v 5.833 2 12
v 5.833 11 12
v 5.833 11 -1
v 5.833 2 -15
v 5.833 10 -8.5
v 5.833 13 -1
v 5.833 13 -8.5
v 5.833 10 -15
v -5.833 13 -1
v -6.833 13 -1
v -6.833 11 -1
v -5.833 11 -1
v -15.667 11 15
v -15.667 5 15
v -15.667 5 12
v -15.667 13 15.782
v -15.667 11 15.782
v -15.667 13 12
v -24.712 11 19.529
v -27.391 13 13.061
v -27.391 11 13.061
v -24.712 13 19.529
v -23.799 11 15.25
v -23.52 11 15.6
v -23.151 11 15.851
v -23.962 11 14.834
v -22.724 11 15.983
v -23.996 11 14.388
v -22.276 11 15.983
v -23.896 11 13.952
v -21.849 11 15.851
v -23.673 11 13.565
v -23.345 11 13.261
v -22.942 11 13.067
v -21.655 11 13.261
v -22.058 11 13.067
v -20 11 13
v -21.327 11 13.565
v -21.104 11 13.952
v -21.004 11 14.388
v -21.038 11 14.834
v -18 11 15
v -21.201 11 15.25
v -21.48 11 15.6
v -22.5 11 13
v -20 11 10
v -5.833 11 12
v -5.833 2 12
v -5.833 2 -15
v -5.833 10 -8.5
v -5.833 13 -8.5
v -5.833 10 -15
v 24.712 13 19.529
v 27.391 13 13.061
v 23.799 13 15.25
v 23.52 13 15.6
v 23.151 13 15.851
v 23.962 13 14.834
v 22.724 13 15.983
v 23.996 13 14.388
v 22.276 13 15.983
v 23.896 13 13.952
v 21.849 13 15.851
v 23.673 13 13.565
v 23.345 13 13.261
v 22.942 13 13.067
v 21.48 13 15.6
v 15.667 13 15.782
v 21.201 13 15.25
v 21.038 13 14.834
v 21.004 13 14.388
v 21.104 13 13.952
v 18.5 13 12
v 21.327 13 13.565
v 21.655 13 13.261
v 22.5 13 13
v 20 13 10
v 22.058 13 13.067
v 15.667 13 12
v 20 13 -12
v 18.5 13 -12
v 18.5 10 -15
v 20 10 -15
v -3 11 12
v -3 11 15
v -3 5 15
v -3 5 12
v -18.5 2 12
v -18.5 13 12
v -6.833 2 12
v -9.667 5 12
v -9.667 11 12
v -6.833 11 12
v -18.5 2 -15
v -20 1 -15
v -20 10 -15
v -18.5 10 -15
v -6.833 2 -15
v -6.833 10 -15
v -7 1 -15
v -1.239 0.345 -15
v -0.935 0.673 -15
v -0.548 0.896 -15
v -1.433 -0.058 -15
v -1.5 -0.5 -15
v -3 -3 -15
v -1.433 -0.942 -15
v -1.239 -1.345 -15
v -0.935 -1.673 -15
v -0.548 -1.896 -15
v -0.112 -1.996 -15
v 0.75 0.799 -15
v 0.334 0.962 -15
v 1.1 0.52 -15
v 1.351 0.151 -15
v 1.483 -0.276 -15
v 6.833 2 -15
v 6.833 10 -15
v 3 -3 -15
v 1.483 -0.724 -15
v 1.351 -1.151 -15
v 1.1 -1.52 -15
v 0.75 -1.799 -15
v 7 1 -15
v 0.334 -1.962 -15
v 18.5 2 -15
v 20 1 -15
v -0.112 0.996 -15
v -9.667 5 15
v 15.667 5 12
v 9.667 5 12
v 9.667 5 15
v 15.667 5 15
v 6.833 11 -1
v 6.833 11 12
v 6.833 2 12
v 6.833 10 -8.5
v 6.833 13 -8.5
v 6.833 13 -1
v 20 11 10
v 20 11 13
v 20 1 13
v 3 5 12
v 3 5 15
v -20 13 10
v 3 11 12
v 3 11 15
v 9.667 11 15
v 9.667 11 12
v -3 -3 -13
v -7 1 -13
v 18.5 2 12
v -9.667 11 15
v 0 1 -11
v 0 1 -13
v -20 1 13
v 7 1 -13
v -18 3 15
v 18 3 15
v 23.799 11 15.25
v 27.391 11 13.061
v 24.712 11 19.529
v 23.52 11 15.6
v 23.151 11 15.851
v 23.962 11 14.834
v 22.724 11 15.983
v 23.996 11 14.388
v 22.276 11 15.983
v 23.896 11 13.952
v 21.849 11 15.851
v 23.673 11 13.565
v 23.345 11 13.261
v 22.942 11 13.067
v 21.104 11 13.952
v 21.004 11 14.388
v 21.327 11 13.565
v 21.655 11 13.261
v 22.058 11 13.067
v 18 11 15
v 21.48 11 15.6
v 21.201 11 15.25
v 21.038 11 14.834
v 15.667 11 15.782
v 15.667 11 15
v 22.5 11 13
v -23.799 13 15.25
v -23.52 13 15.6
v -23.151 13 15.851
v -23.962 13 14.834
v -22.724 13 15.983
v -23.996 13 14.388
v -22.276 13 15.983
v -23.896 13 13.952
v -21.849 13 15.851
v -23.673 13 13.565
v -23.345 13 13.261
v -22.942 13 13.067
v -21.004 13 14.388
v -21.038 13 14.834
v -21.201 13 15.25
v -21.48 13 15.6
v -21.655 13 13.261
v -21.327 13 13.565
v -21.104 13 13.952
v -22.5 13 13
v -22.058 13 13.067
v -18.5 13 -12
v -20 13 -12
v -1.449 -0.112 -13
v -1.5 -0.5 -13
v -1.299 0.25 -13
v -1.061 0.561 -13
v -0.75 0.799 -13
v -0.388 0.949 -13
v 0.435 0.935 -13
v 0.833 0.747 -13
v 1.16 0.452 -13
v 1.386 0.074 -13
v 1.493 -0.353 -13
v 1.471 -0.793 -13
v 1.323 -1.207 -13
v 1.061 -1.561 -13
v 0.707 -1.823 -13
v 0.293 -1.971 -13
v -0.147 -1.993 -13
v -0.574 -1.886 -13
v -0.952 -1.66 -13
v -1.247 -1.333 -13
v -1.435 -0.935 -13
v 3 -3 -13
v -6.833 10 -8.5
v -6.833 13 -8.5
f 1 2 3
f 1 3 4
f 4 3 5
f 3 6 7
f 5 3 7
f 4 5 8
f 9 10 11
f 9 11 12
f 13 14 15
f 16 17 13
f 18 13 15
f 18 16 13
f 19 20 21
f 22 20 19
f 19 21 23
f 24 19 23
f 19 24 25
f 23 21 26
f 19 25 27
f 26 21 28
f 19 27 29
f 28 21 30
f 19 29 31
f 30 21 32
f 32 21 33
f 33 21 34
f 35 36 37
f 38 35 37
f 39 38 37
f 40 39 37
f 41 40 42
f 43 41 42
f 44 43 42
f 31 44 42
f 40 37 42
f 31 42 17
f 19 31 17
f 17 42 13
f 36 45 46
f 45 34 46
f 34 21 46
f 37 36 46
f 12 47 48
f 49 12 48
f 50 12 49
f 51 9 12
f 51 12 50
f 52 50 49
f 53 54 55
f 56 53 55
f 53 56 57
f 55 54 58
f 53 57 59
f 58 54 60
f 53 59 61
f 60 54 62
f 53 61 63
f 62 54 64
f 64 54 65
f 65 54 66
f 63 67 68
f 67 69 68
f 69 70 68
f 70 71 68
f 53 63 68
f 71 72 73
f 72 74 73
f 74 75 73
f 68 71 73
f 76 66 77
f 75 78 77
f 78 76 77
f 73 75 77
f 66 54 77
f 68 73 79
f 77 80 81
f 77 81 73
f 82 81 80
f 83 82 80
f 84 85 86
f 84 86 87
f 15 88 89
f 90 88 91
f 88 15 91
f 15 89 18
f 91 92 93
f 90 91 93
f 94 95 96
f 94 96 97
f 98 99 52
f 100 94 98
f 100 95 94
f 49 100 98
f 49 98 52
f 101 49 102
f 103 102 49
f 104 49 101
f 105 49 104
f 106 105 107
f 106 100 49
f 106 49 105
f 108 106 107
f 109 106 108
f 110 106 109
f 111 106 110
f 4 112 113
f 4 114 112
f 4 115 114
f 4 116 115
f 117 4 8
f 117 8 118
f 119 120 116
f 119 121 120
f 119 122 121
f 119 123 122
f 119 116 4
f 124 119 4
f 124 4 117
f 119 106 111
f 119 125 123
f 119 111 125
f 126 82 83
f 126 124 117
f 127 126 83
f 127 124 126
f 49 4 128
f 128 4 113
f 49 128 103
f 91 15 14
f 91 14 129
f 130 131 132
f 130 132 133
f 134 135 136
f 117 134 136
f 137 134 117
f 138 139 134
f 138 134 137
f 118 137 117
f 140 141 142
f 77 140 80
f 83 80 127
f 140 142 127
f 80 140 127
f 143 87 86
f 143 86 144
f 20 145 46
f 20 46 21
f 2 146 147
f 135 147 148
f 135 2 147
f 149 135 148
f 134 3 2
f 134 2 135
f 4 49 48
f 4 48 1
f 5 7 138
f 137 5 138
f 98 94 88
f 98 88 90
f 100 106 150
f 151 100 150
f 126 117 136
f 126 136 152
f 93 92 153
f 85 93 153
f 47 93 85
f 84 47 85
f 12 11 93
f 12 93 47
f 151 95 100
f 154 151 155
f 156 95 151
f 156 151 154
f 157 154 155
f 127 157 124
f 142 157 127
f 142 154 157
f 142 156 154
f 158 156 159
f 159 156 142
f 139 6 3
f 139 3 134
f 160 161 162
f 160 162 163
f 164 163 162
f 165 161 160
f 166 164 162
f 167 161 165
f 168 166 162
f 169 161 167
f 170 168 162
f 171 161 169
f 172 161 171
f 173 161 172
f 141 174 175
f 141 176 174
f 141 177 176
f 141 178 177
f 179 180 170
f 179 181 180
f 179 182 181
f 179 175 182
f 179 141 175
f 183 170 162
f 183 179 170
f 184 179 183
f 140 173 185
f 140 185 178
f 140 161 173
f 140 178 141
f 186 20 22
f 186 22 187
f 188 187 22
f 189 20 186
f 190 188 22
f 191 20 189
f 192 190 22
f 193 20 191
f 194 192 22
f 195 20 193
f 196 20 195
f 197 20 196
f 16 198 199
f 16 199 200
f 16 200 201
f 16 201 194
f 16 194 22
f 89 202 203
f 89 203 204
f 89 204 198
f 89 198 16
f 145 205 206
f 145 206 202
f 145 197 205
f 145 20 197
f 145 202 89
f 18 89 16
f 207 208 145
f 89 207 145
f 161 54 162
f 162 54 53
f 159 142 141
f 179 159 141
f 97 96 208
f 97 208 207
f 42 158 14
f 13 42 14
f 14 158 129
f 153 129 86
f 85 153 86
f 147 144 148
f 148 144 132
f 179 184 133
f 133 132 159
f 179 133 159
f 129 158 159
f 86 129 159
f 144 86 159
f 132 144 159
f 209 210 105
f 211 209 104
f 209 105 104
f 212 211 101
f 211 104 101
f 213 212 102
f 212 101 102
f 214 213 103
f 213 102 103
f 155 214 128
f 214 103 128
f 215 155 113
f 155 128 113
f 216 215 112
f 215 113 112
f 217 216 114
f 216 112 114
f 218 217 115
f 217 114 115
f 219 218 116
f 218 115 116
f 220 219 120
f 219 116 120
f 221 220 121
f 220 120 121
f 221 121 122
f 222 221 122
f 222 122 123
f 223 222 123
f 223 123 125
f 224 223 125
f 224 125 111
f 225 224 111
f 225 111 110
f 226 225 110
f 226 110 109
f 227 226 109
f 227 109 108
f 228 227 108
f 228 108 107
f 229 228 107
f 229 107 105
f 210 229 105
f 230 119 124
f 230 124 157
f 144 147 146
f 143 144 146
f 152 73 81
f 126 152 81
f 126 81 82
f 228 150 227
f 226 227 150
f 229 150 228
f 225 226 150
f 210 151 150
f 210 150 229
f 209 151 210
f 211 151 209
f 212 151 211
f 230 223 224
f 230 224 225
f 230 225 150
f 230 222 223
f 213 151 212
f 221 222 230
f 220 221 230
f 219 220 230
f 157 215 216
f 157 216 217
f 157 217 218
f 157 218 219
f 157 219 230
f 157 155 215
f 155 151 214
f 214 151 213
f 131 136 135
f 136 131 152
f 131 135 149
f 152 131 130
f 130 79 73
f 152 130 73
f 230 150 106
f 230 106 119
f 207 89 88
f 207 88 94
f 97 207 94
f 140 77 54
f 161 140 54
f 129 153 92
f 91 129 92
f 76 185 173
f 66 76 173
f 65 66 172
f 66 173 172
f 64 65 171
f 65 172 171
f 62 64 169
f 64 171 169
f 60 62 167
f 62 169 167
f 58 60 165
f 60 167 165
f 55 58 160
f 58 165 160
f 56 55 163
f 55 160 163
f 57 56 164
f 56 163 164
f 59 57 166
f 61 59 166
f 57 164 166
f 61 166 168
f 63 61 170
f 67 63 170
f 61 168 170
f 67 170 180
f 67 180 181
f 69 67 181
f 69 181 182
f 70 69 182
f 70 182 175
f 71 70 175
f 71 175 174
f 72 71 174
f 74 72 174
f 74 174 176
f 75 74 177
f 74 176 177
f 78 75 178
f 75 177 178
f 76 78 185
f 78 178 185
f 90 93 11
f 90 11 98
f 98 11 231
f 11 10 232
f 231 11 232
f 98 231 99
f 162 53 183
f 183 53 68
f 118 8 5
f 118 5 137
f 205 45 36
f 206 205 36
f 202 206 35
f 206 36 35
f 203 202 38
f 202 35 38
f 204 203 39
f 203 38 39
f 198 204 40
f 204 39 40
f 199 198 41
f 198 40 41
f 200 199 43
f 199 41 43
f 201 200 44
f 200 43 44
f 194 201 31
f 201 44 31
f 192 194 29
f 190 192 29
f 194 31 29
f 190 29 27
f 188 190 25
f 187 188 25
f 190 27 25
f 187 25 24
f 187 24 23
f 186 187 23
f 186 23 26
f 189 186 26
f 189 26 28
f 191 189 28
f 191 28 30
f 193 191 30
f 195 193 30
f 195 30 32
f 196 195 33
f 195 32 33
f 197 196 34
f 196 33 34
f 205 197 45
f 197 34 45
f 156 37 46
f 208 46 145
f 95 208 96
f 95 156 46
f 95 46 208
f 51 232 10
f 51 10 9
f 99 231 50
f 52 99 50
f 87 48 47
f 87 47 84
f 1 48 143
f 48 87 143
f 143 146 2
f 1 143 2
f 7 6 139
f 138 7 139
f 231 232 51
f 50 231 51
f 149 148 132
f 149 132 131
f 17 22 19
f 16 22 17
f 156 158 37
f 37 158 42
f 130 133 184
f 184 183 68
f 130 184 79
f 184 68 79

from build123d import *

# Parameters (mm, degrees)
SKETCH1_W           = 40
SKETCH1_H           = 30
BOSS_EXTRUDE1_DEPTH = 10
SKETCH5_W           = 40
SKETCH5_H           = 27
BOSS_EXTRUDE2_DEPTH = 3
SKETCH2_W           = 11.666666667
SKETCH2_H           = 27
SKETCH2_W_2         = 11.666666666
CUT_EXTRUDE1_DEPTH  = 11
SKETCH4_W           = 6
SKETCH4_H           = 3
CUT_EXTRUDE2_DEPTH  = 8
SKETCH6_W           = 19.333333334
SKETCH6_H           = 16
CUT_EXTRUDE3_DEPTH  = 2
CHAMFER2_SIZE       = 3
BOSS_EXTRUDE3_DEPTH = 2
SKETCH9_R           = 1.5
CUT_EXTRUDE5_DEPTH  = 2
SKETCH11_W          = 40
SKETCH11_H          = 30
CUT_EXTRUDE6_DEPTH  = 1
CHAMFER3_SIZE       = 2
SKETCH14_W          = 6
SKETCH14_H          = 2
BOSS_EXTRUDE4_DEPTH = 4
SKETCH15_R          = 1.5
CUT_EXTRUDE7_DEPTH  = 4
CHAMFER7_SIZE       = 4
SKETCH16_W          = 13.666666666
SKETCH16_H          = 6.5
CUT_EXTRUDE8_DEPTH  = 3


with BuildPart() as part:
    # Sketch1 → Boss-Extrude1 (new body)
    with BuildSketch(Plane(origin=(0, 0, 0), x_dir=(1, 0, 0), z_dir=(0, 1, 0))):
        Rectangle(SKETCH1_W, SKETCH1_H)
    extrude(amount=BOSS_EXTRUDE1_DEPTH)

    # Sketch5 → Boss-Extrude2 (add)
    with BuildSketch(Plane(origin=(0, 10, 0), x_dir=(1, 0, 0), z_dir=(0, 1, 0))):
        with Locations((0, -1.5)):
            Rectangle(SKETCH5_W, SKETCH5_H)
    extrude(amount=BOSS_EXTRUDE2_DEPTH)

    # Sketch2 → Cut-Extrude1 (cut)
    with BuildSketch(Plane(origin=(0, 13, 0), x_dir=(1, 0, 0), z_dir=(0, 1, 0))):
        with Locations((-12.666666666, 1.5)):
            Rectangle(SKETCH2_W, SKETCH2_H)
        with Locations((0, 1.5)):
            Rectangle(SKETCH2_W_2, SKETCH2_H)
        with Locations((12.666666666, 1.5)):
            Rectangle(SKETCH2_W, SKETCH2_H)
    extrude(amount=-CUT_EXTRUDE1_DEPTH, mode=Mode.SUBTRACT)

    # Sketch4 → Cut-Extrude2 (cut)
    with BuildSketch(Plane(origin=(0, 13, 0), x_dir=(1, 0, 0), z_dir=(0, 1, 0))):
        with Locations((-12.666666667, -13.5)):
            Rectangle(SKETCH4_W, SKETCH4_H)
        with Locations((0, -13.5)):
            Rectangle(SKETCH4_W, SKETCH4_H)
        with Locations((12.666666667, -13.5)):
            Rectangle(SKETCH4_W, SKETCH4_H)
    extrude(amount=-CUT_EXTRUDE2_DEPTH, mode=Mode.SUBTRACT)

    # Sketch6 → Cut-Extrude3 (cut)
    with BuildSketch(Plane(origin=(0, 13, 0), x_dir=(1, 0, 0), z_dir=(0, 1, 0))):
        with Locations((0, -7)):
            Rectangle(SKETCH6_W, SKETCH6_H)
    extrude(amount=-CUT_EXTRUDE3_DEPTH, mode=Mode.SUBTRACT)

    # Chamfer2
    chamfer2_edges = [part.edges().sort_by_distance(p)[0] for p in [
        (19.25, 10, -12),
        (6.333333333, 10, -12),
        (-6.333333333, 10, -12),
        (-19.25, 10, -12),
    ]]
    chamfer(chamfer2_edges, length=CHAMFER2_SIZE - 0.0001)  # a hair under: the kernel refuses the full size

    # Sketch8 → Boss-Extrude3 (add)
    with BuildSketch(Plane(origin=(0, 13, 0), x_dir=(1, 0, 0), z_dir=(0, 1, 0))):
        Polygon((20, -10), (27.39103626, -13.061467459), (24.712252234, -19.528624186), (15.666666667, -15.781819965), (15.666666667, -15), (18.5, -12), align=None)
    boss_extrude3 = extrude(amount=-BOSS_EXTRUDE3_DEPTH)

    # Mirror1: Boss-Extrude3 across plane
    add(boss_extrude3.mirror(Plane(origin=(0, 0, 0), x_dir=(0, 0, 1), z_dir=(1, 0, 0))))

    # Sketch9 → Cut-Extrude5 (cut)
    with BuildSketch(Plane.XZ.offset(-11)):
        with Locations(Location((-22.5, 14.5, 0), (0, 0, 270))):
            Circle(SKETCH9_R)
        with Locations(Location((22.5, 14.5, 0), (0, 0, 270))):
            Circle(SKETCH9_R)
    extrude(amount=-CUT_EXTRUDE5_DEPTH, mode=Mode.SUBTRACT)

    # Sketch11 → Cut-Extrude6 (cut)
    with BuildSketch(Plane.XZ):
        Rectangle(SKETCH11_W, SKETCH11_H)
    extrude(amount=-CUT_EXTRUDE6_DEPTH, mode=Mode.SUBTRACT)

    # Chamfer3
    chamfer3_edges = [part.edges().sort_by_distance(p)[0] for p in [
        (20, 6, 15),
        (-20, 6, 15),
        (0, 1, 15),
    ]]
    chamfer(chamfer3_edges, length=CHAMFER3_SIZE)

    # Sketch14 → Boss-Extrude4 (add)
    with BuildSketch(Plane.XZ.offset(-1)):
        with Locations((0, -14)):
            Rectangle(SKETCH14_W, SKETCH14_H)
    extrude(amount=BOSS_EXTRUDE4_DEPTH)

    # Sketch15 → Cut-Extrude7 (cut)
    with BuildSketch(Plane(origin=(0, 0, -15), x_dir=(-1, 0, 0), z_dir=(0, 0, -1))):
        with Locations((0, -0.5)):
            Circle(SKETCH15_R)
    extrude(amount=-CUT_EXTRUDE7_DEPTH, mode=Mode.SUBTRACT)

    # Chamfer7
    chamfer7_edges = [part.edges().sort_by_distance(p)[0] for p in [
        (3, 1, -14),
        (-3, 1, -14),
    ]]
    chamfer(chamfer7_edges, length=CHAMFER7_SIZE - 0.0001)  # a hair under: the kernel refuses the full size

    # Sketch16 → Cut-Extrude8 (cut)
    with BuildSketch(Plane(origin=(0, 13, 0), x_dir=(1, 0, 0), z_dir=(0, 1, 0))):
        with Locations((0, 11.75)):
            Rectangle(SKETCH16_W, SKETCH16_H)
    extrude(amount=-CUT_EXTRUDE8_DEPTH, mode=Mode.SUBTRACT)


solid = part.part
